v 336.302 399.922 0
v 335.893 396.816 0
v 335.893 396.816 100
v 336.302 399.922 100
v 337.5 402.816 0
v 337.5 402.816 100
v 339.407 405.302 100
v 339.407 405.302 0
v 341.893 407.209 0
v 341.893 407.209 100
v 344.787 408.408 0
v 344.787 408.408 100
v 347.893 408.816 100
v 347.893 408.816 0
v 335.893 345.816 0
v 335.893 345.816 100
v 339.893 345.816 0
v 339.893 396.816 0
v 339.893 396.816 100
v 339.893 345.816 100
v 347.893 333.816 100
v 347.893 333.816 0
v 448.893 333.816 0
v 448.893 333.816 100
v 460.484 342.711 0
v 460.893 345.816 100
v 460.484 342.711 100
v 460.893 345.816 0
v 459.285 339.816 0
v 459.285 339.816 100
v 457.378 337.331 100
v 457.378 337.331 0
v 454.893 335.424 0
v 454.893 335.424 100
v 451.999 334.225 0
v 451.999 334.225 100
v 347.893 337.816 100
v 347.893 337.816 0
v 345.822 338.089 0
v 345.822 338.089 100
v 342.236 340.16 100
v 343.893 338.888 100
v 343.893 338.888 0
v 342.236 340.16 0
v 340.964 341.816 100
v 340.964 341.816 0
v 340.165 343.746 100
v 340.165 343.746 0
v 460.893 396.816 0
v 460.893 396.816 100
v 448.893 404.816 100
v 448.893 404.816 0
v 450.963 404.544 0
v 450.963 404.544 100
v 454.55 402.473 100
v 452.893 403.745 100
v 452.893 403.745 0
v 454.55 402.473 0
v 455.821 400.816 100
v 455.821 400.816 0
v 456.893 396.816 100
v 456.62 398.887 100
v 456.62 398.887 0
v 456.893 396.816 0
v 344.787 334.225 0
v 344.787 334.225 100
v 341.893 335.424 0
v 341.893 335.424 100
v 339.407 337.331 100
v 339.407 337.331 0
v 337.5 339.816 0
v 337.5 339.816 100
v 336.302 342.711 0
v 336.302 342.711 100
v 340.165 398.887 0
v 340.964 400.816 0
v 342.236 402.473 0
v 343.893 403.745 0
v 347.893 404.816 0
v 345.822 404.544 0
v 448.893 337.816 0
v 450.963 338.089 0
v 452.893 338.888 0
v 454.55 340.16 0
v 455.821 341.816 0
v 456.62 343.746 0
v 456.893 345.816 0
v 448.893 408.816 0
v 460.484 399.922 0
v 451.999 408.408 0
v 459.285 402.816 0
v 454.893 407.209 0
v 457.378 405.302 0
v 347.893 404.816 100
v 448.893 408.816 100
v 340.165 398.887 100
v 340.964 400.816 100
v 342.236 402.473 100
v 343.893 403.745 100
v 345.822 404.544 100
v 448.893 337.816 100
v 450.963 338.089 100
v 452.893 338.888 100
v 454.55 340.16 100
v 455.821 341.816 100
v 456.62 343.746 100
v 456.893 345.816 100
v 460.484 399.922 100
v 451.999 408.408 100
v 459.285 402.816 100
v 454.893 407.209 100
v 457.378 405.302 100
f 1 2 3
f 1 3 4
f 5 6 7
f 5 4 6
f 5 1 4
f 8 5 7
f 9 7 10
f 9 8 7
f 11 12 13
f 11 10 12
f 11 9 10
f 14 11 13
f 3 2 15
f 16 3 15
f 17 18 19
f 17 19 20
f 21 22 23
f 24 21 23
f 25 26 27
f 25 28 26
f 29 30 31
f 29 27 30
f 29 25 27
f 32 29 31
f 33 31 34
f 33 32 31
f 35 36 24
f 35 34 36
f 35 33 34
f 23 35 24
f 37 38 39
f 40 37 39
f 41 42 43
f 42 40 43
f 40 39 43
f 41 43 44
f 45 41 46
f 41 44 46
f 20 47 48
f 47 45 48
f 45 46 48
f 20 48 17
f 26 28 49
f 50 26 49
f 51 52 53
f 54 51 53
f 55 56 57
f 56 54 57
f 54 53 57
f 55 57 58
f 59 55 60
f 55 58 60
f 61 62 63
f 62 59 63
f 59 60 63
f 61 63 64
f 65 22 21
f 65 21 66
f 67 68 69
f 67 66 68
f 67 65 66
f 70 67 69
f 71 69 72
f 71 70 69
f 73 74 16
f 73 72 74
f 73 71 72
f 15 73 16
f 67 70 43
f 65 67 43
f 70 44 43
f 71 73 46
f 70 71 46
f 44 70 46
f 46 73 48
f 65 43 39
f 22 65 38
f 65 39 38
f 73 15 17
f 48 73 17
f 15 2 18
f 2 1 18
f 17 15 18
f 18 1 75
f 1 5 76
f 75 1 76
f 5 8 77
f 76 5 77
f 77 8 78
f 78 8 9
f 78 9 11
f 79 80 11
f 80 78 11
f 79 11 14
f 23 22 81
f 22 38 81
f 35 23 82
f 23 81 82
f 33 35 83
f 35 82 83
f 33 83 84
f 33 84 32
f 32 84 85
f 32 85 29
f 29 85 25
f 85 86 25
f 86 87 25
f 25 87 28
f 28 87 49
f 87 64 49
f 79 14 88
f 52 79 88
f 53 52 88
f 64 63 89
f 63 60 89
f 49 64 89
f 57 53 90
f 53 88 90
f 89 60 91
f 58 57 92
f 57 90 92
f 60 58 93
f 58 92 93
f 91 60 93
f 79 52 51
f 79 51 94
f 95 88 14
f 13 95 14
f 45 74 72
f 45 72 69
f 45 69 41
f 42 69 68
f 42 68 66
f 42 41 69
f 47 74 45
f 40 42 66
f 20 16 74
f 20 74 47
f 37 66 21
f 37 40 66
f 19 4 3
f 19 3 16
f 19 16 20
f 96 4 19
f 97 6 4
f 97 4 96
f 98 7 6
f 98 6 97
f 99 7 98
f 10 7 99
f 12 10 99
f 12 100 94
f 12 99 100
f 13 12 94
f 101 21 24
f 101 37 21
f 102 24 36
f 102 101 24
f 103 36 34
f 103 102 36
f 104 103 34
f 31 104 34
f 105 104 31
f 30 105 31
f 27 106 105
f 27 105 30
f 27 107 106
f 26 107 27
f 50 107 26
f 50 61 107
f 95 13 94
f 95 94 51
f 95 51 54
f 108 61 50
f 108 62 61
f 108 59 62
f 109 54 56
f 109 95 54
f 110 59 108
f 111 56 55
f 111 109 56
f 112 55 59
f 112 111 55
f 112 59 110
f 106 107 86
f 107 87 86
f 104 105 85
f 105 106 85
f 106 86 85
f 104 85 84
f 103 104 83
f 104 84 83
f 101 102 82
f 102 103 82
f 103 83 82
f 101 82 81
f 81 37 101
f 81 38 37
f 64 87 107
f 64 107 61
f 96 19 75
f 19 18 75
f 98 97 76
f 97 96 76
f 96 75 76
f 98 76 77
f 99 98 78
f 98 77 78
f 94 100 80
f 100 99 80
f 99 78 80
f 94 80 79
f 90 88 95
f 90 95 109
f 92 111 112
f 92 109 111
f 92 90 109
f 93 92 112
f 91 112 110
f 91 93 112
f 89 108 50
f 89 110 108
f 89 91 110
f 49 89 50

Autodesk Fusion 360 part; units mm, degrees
sketch "スケッチ1" plane through (0, 0, 0) normal (0, 0, 1) x (1, 0, 0)
  line L0 (347.8927, 333.8164) -> (448.8927, 333.8164)
  line L1 (347.8927, 337.8164) -> (448.8927, 337.8164)
  line L2 (448.8927, 408.8164) -> (347.8927, 408.8164)
  line L3 (448.8927, 404.8164) -> (347.8927, 404.8164)
  line L4 (335.8927, 396.8164) -> (335.8927, 345.8164)
  line L5 (339.8927, 396.8164) -> (339.8927, 345.8164)
  arc A0 (335.8927, 345.8164) -> (347.8927, 333.8164) centre (347.8927, 345.8164) ccw
  arc A1 (339.8927, 345.8164) -> (347.8927, 337.8164) centre (347.8927, 345.8164) ccw
  arc A2 (347.8927, 408.8164) -> (335.8927, 396.8164) centre (347.8927, 396.8164) ccw
  arc A3 (347.8927, 404.8164) -> (339.8927, 396.8164) centre (347.8927, 396.8164) ccw
  line L6 (460.8927, 345.8164) -> (460.8927, 396.8164)
  line L7 (456.8927, 345.8164) -> (456.8927, 396.8164)
  arc A4 (448.8927, 333.8164) -> (460.8927, 345.8164) centre (448.8927, 345.8164) ccw
  arc A5 (448.8927, 337.8164) -> (456.8927, 345.8164) centre (448.8927, 345.8164) ccw
  arc A6 (460.8927, 396.8164) -> (448.8927, 408.8164) centre (448.8927, 396.8164) ccw
  arc A7 (456.8927, 396.8164) -> (448.8927, 404.8164) centre (448.8927, 396.8164) ccw
  point P0 (398.3927, 371.3164)
extrude "押し出し1" add sketch "スケッチ1" along normal blind 100
